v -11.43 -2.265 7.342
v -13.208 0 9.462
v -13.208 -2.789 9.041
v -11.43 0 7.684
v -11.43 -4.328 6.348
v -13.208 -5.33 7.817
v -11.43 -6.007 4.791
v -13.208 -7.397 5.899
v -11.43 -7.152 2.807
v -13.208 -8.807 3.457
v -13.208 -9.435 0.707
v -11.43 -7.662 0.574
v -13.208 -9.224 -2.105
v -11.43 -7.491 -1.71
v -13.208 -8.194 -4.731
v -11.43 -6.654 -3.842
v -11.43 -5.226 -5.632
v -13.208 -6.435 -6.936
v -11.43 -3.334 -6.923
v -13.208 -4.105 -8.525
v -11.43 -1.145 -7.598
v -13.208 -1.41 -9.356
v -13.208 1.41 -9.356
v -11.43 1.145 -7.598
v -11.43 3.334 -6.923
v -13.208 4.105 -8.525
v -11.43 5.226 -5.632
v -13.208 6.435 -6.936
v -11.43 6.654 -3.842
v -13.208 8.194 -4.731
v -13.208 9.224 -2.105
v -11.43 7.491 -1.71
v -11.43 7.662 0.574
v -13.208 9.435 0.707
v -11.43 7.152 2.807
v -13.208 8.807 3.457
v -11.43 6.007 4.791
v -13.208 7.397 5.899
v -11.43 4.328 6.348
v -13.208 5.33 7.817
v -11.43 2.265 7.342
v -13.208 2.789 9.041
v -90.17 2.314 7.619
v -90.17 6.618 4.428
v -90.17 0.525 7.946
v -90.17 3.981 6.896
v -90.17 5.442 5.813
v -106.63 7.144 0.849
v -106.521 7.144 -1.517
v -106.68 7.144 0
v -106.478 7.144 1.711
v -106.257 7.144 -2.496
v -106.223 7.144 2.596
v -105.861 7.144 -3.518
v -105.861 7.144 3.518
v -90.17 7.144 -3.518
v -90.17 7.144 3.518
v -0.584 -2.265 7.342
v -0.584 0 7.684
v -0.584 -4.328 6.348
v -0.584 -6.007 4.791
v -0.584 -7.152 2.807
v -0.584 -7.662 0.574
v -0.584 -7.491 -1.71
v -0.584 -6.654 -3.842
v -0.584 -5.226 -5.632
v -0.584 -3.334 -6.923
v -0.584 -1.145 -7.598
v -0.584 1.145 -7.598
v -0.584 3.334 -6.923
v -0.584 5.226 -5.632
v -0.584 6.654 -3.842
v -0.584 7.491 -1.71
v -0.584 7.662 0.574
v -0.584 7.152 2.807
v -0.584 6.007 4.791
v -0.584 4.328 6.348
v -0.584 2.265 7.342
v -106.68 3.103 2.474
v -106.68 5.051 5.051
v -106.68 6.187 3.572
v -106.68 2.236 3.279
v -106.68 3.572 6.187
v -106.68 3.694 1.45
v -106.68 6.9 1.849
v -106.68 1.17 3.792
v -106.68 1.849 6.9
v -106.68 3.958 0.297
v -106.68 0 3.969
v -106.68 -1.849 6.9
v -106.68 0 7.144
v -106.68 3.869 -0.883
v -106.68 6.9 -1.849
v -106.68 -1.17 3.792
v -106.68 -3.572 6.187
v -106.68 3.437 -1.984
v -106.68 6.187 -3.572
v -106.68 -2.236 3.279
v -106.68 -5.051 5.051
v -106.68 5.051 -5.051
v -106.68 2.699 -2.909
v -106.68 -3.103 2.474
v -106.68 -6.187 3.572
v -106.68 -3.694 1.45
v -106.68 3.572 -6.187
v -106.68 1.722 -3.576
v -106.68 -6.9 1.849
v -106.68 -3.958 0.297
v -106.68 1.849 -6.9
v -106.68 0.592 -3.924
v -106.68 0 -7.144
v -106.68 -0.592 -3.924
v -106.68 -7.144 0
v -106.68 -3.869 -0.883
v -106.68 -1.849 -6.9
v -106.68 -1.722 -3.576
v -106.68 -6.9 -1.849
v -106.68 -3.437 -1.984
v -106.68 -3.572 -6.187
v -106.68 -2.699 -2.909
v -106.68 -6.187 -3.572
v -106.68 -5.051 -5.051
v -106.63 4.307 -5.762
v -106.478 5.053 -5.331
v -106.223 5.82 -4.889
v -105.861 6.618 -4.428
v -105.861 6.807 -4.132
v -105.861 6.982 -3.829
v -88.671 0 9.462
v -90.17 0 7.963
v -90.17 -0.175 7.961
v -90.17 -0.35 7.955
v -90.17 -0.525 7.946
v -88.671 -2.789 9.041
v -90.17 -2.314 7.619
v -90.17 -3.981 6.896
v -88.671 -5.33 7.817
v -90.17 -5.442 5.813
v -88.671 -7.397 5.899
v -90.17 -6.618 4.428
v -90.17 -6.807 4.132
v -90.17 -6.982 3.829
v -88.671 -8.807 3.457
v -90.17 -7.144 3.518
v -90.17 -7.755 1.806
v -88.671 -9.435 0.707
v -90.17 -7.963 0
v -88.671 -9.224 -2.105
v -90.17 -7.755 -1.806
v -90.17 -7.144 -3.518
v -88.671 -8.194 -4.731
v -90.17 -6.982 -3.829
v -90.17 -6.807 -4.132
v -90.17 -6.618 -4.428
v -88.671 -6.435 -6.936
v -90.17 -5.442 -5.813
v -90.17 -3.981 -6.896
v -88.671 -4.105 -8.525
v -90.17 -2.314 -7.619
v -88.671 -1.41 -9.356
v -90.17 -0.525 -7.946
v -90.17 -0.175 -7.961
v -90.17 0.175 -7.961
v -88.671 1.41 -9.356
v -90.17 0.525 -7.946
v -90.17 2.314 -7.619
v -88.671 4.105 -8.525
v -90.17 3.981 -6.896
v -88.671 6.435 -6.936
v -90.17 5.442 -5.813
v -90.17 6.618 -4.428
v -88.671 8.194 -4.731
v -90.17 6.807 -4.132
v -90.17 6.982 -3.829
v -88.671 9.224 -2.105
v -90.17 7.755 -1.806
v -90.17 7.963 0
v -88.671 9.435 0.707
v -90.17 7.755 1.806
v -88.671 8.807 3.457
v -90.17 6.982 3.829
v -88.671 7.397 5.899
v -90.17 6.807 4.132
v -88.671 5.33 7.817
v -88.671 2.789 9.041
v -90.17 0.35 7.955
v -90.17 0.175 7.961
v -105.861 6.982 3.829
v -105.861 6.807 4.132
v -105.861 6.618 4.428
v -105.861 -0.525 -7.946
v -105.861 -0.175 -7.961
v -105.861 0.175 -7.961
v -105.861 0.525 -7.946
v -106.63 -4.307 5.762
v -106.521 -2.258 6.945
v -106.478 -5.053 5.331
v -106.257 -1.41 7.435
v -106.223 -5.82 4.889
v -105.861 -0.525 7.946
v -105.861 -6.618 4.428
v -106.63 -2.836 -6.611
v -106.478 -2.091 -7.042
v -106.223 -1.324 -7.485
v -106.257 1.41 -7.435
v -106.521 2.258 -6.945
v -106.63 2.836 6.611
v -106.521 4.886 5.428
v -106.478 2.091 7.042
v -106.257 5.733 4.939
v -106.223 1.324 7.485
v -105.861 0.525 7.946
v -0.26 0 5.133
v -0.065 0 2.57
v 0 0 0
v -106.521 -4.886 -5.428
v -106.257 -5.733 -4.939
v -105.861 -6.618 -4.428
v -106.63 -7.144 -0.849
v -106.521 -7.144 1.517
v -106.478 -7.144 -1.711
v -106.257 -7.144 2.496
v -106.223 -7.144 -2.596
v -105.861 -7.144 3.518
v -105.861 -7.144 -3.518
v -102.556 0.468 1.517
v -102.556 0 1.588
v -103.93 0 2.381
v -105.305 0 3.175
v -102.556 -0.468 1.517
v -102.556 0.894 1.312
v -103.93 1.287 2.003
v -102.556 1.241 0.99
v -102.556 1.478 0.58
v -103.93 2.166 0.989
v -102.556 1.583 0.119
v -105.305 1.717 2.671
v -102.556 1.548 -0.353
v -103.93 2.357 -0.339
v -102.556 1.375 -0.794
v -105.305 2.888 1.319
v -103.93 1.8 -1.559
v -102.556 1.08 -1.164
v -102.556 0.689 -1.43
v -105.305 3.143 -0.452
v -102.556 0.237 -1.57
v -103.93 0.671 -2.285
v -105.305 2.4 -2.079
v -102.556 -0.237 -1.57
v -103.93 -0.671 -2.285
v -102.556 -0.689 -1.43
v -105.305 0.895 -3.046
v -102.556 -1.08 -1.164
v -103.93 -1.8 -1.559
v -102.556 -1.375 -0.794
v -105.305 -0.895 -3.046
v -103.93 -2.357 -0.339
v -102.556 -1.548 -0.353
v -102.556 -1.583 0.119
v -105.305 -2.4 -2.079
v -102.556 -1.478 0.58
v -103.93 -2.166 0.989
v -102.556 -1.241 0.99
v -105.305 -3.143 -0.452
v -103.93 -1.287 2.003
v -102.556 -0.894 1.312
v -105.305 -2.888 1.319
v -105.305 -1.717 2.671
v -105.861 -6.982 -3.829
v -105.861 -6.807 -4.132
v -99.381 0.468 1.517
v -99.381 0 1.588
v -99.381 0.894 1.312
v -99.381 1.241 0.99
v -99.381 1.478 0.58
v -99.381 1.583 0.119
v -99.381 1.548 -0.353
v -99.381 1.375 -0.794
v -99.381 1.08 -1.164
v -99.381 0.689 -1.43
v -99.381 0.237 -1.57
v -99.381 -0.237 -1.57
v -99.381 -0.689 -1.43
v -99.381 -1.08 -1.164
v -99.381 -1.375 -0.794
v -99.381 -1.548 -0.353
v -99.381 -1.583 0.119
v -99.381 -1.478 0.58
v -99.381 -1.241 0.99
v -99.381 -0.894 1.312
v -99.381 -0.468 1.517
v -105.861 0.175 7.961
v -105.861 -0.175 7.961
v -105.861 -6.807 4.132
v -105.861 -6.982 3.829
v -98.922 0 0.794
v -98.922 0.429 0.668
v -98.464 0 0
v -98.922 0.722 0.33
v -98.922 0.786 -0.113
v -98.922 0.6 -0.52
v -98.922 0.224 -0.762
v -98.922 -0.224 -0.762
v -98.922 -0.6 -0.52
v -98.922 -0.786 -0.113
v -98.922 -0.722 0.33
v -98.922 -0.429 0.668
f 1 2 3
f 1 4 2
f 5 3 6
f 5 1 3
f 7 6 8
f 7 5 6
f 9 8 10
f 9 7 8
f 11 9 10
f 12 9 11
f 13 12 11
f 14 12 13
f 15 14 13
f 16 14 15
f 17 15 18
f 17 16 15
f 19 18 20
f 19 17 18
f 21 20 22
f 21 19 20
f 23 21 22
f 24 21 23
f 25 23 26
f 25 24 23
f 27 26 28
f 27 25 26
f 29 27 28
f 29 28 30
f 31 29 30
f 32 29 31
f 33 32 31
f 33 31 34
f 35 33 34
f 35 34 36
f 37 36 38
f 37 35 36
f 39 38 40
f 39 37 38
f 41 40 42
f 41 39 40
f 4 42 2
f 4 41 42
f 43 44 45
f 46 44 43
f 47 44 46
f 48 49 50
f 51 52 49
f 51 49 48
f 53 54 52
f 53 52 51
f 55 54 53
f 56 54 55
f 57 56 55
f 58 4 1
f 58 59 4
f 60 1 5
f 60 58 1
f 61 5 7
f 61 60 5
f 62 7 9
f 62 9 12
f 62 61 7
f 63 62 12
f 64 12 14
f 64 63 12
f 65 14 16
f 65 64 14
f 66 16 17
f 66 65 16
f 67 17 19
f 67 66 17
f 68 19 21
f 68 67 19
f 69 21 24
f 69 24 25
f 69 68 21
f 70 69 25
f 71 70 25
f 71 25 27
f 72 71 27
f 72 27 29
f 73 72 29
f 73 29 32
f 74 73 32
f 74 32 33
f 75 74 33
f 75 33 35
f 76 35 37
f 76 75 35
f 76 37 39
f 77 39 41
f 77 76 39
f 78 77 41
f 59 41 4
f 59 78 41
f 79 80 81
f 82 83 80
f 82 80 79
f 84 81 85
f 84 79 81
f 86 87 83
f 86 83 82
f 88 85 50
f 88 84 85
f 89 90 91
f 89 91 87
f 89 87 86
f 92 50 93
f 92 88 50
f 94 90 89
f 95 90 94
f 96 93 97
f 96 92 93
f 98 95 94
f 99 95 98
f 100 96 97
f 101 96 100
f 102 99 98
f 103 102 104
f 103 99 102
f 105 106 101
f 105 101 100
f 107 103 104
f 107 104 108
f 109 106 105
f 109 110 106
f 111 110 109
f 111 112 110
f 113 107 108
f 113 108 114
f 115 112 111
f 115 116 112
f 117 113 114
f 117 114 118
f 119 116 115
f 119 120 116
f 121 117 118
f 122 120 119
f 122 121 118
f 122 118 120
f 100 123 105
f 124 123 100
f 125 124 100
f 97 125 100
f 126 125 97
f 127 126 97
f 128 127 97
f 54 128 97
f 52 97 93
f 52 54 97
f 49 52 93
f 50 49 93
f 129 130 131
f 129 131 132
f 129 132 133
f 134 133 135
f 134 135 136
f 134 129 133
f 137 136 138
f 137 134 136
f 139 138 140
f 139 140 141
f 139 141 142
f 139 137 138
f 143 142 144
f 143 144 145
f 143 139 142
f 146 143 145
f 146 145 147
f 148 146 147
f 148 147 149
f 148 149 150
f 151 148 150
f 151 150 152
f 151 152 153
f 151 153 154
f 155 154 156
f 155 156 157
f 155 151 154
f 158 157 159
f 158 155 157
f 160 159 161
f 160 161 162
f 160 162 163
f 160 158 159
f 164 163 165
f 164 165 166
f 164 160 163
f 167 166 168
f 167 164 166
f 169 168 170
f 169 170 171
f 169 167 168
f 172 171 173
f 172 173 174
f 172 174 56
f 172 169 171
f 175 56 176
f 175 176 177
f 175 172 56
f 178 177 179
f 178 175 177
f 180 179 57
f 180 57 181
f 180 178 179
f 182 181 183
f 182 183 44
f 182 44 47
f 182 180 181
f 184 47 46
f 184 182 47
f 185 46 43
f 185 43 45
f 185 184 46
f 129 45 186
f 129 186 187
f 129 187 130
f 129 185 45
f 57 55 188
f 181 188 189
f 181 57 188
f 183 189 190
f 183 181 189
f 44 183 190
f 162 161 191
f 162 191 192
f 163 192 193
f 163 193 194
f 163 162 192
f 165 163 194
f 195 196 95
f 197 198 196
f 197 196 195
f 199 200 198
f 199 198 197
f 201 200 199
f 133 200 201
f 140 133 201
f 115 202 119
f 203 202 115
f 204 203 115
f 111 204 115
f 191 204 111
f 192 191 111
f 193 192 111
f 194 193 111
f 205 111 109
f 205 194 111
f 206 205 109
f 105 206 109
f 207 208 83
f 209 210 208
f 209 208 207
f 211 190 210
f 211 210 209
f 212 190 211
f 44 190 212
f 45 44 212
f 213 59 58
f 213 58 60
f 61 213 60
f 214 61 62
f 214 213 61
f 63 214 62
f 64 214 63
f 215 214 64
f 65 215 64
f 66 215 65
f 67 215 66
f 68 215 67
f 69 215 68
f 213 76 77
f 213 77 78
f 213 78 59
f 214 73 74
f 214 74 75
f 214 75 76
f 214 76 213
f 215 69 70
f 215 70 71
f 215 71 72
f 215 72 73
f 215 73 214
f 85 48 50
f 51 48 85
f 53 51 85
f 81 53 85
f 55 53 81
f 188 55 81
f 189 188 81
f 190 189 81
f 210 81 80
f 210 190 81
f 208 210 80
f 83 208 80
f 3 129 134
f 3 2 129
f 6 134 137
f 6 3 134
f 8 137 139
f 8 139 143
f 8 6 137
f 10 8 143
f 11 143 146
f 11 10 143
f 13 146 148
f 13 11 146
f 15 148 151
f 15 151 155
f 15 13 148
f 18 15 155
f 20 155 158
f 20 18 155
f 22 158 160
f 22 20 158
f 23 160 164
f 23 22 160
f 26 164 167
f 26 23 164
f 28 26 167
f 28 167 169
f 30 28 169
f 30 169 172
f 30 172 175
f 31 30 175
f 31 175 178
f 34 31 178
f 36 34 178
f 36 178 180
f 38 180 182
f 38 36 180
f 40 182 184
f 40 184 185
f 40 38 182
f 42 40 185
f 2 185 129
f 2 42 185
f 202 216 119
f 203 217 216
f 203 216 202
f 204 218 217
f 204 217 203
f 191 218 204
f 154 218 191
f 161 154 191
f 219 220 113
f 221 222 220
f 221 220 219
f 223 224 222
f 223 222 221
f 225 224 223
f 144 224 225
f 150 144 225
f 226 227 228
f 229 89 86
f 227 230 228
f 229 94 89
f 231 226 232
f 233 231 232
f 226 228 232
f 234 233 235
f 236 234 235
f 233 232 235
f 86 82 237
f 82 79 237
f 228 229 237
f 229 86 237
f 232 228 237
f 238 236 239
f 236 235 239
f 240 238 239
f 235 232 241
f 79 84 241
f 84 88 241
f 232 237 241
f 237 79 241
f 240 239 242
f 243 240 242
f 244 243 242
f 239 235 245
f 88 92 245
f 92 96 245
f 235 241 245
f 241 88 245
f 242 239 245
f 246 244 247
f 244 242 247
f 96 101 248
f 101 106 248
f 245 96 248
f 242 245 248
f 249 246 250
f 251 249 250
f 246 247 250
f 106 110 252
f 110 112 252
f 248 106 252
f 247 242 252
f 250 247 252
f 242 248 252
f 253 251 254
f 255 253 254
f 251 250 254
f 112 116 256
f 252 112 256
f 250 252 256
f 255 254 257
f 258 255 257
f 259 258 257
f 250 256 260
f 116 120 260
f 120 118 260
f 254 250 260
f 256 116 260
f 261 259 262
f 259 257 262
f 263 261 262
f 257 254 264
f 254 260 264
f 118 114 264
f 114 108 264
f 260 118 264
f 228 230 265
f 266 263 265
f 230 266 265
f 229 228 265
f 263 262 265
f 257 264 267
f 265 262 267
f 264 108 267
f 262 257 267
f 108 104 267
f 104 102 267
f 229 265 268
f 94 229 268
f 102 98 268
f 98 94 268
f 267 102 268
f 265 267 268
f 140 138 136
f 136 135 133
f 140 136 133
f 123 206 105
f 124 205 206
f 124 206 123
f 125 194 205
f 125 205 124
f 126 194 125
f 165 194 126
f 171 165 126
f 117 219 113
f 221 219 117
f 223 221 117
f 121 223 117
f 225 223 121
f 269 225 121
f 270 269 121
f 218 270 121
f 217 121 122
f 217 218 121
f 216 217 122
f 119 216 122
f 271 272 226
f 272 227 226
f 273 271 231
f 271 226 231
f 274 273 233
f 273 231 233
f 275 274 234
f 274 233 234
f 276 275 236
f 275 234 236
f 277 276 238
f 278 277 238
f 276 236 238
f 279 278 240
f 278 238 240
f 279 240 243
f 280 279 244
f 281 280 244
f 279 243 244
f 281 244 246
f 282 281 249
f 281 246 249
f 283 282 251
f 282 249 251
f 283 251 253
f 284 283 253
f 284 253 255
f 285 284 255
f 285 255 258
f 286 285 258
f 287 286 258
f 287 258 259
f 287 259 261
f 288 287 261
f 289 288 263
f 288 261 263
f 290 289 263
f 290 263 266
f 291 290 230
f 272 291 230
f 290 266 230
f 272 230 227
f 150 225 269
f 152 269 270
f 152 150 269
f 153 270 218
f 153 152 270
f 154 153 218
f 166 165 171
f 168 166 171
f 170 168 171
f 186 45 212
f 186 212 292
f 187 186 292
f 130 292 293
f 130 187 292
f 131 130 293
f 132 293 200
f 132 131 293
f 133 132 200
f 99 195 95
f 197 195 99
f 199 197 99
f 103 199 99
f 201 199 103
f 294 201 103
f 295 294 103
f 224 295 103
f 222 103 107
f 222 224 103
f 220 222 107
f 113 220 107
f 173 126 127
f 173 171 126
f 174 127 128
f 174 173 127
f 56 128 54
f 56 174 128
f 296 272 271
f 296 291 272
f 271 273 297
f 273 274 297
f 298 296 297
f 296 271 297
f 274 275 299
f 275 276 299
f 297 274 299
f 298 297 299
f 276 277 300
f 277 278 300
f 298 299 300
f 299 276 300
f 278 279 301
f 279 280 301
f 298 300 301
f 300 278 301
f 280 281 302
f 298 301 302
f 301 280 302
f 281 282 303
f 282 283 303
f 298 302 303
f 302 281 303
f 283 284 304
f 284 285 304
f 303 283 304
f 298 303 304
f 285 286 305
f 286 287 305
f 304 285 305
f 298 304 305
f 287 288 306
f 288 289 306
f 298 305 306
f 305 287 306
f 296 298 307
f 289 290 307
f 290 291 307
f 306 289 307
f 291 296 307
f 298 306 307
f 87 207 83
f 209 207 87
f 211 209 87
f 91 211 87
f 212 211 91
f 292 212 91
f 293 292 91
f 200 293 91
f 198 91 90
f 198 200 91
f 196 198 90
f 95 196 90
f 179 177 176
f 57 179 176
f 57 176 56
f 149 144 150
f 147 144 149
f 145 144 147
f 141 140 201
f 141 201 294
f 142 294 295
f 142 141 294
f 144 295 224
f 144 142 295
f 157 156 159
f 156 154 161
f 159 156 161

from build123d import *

# Parameters (mm, degrees)
SKETCH1_OUTSIDE_W  = 42.92
SKETCH1_OUTSIDE_H  = 42.92
CUT_EXTRUDE1_DEPTH = 17.51


with BuildPart() as part:
    # Sketch1 w/mock PCB → Revolve1 (revolve)
    with BuildSketch(Plane.XY, mode=Mode.PRIVATE) as revolve1_sk:
        with BuildLine():
            Line((0, 0), (-106.68, 0))
            Line((-106.68, 0), (-106.68, 7.14375))
            Line((-106.68, 7.14375), (-105.86085, 7.9629))
            Line((-105.86085, 7.9629), (-90.17, 7.9629))
            Line((-90.17, 7.9629), (-88.6714, 9.4615))
            Line((-88.6714, 9.4615), (-13.208, 9.4615))
            Line((-13.208, 9.4615), (-11.43, 7.6835))
            Line((-11.43, 7.6835), (-0.584426442, 7.6835))
            ThreePointArc((-0.584426442, 7.6835), (-0.146317327, 3.852847211), (0, 0))
        make_face()
    revolve(revolve1_sk.sketch.rotate(Axis((0, 0, 0), (1, 0, 0)), 90), axis=Axis((0, 0, 0), (1, 0, 0)))  # turned: the seam where the file's is

    # Sketch1 outside → Cut-Extrude1 (cut, through all)
    with BuildSketch(Plane(origin=(-90.17, 0, 0), x_dir=(0, 0, -1), z_dir=(1, 0, 0))):
        Rectangle(SKETCH1_OUTSIDE_W, SKETCH1_OUTSIDE_H)
        Polygon((4.124445986, 7.14375), (-4.124445986, 7.14375), (-8.248891971, 0), (-4.124445986, -7.14375), (4.124445986, -7.14375), (8.248891971, 0), align=None, mode=Mode.SUBTRACT)
    extrude(amount=-CUT_EXTRUDE1_DEPTH, mode=Mode.SUBTRACT)

    # Sketch2 → Cut-Revolve1 (revolve, cut)
    with BuildSketch(Plane.XY, mode=Mode.PRIVATE) as cut_revolve1_sk:
        Polygon((-98.464010462, 0), (-99.380554014, 1.5875), (-102.555554014, 1.5875), (-106.68, 3.96875), (-106.68, 0), align=None)
    revolve(cut_revolve1_sk.sketch.rotate(Axis((-106.68, 0, 0), (-1, 0, 0)), 270), axis=Axis((-106.68, 0, 0), (-1, 0, 0)), mode=Mode.SUBTRACT)  # turned: the seam where the file's is


solid = part.part
